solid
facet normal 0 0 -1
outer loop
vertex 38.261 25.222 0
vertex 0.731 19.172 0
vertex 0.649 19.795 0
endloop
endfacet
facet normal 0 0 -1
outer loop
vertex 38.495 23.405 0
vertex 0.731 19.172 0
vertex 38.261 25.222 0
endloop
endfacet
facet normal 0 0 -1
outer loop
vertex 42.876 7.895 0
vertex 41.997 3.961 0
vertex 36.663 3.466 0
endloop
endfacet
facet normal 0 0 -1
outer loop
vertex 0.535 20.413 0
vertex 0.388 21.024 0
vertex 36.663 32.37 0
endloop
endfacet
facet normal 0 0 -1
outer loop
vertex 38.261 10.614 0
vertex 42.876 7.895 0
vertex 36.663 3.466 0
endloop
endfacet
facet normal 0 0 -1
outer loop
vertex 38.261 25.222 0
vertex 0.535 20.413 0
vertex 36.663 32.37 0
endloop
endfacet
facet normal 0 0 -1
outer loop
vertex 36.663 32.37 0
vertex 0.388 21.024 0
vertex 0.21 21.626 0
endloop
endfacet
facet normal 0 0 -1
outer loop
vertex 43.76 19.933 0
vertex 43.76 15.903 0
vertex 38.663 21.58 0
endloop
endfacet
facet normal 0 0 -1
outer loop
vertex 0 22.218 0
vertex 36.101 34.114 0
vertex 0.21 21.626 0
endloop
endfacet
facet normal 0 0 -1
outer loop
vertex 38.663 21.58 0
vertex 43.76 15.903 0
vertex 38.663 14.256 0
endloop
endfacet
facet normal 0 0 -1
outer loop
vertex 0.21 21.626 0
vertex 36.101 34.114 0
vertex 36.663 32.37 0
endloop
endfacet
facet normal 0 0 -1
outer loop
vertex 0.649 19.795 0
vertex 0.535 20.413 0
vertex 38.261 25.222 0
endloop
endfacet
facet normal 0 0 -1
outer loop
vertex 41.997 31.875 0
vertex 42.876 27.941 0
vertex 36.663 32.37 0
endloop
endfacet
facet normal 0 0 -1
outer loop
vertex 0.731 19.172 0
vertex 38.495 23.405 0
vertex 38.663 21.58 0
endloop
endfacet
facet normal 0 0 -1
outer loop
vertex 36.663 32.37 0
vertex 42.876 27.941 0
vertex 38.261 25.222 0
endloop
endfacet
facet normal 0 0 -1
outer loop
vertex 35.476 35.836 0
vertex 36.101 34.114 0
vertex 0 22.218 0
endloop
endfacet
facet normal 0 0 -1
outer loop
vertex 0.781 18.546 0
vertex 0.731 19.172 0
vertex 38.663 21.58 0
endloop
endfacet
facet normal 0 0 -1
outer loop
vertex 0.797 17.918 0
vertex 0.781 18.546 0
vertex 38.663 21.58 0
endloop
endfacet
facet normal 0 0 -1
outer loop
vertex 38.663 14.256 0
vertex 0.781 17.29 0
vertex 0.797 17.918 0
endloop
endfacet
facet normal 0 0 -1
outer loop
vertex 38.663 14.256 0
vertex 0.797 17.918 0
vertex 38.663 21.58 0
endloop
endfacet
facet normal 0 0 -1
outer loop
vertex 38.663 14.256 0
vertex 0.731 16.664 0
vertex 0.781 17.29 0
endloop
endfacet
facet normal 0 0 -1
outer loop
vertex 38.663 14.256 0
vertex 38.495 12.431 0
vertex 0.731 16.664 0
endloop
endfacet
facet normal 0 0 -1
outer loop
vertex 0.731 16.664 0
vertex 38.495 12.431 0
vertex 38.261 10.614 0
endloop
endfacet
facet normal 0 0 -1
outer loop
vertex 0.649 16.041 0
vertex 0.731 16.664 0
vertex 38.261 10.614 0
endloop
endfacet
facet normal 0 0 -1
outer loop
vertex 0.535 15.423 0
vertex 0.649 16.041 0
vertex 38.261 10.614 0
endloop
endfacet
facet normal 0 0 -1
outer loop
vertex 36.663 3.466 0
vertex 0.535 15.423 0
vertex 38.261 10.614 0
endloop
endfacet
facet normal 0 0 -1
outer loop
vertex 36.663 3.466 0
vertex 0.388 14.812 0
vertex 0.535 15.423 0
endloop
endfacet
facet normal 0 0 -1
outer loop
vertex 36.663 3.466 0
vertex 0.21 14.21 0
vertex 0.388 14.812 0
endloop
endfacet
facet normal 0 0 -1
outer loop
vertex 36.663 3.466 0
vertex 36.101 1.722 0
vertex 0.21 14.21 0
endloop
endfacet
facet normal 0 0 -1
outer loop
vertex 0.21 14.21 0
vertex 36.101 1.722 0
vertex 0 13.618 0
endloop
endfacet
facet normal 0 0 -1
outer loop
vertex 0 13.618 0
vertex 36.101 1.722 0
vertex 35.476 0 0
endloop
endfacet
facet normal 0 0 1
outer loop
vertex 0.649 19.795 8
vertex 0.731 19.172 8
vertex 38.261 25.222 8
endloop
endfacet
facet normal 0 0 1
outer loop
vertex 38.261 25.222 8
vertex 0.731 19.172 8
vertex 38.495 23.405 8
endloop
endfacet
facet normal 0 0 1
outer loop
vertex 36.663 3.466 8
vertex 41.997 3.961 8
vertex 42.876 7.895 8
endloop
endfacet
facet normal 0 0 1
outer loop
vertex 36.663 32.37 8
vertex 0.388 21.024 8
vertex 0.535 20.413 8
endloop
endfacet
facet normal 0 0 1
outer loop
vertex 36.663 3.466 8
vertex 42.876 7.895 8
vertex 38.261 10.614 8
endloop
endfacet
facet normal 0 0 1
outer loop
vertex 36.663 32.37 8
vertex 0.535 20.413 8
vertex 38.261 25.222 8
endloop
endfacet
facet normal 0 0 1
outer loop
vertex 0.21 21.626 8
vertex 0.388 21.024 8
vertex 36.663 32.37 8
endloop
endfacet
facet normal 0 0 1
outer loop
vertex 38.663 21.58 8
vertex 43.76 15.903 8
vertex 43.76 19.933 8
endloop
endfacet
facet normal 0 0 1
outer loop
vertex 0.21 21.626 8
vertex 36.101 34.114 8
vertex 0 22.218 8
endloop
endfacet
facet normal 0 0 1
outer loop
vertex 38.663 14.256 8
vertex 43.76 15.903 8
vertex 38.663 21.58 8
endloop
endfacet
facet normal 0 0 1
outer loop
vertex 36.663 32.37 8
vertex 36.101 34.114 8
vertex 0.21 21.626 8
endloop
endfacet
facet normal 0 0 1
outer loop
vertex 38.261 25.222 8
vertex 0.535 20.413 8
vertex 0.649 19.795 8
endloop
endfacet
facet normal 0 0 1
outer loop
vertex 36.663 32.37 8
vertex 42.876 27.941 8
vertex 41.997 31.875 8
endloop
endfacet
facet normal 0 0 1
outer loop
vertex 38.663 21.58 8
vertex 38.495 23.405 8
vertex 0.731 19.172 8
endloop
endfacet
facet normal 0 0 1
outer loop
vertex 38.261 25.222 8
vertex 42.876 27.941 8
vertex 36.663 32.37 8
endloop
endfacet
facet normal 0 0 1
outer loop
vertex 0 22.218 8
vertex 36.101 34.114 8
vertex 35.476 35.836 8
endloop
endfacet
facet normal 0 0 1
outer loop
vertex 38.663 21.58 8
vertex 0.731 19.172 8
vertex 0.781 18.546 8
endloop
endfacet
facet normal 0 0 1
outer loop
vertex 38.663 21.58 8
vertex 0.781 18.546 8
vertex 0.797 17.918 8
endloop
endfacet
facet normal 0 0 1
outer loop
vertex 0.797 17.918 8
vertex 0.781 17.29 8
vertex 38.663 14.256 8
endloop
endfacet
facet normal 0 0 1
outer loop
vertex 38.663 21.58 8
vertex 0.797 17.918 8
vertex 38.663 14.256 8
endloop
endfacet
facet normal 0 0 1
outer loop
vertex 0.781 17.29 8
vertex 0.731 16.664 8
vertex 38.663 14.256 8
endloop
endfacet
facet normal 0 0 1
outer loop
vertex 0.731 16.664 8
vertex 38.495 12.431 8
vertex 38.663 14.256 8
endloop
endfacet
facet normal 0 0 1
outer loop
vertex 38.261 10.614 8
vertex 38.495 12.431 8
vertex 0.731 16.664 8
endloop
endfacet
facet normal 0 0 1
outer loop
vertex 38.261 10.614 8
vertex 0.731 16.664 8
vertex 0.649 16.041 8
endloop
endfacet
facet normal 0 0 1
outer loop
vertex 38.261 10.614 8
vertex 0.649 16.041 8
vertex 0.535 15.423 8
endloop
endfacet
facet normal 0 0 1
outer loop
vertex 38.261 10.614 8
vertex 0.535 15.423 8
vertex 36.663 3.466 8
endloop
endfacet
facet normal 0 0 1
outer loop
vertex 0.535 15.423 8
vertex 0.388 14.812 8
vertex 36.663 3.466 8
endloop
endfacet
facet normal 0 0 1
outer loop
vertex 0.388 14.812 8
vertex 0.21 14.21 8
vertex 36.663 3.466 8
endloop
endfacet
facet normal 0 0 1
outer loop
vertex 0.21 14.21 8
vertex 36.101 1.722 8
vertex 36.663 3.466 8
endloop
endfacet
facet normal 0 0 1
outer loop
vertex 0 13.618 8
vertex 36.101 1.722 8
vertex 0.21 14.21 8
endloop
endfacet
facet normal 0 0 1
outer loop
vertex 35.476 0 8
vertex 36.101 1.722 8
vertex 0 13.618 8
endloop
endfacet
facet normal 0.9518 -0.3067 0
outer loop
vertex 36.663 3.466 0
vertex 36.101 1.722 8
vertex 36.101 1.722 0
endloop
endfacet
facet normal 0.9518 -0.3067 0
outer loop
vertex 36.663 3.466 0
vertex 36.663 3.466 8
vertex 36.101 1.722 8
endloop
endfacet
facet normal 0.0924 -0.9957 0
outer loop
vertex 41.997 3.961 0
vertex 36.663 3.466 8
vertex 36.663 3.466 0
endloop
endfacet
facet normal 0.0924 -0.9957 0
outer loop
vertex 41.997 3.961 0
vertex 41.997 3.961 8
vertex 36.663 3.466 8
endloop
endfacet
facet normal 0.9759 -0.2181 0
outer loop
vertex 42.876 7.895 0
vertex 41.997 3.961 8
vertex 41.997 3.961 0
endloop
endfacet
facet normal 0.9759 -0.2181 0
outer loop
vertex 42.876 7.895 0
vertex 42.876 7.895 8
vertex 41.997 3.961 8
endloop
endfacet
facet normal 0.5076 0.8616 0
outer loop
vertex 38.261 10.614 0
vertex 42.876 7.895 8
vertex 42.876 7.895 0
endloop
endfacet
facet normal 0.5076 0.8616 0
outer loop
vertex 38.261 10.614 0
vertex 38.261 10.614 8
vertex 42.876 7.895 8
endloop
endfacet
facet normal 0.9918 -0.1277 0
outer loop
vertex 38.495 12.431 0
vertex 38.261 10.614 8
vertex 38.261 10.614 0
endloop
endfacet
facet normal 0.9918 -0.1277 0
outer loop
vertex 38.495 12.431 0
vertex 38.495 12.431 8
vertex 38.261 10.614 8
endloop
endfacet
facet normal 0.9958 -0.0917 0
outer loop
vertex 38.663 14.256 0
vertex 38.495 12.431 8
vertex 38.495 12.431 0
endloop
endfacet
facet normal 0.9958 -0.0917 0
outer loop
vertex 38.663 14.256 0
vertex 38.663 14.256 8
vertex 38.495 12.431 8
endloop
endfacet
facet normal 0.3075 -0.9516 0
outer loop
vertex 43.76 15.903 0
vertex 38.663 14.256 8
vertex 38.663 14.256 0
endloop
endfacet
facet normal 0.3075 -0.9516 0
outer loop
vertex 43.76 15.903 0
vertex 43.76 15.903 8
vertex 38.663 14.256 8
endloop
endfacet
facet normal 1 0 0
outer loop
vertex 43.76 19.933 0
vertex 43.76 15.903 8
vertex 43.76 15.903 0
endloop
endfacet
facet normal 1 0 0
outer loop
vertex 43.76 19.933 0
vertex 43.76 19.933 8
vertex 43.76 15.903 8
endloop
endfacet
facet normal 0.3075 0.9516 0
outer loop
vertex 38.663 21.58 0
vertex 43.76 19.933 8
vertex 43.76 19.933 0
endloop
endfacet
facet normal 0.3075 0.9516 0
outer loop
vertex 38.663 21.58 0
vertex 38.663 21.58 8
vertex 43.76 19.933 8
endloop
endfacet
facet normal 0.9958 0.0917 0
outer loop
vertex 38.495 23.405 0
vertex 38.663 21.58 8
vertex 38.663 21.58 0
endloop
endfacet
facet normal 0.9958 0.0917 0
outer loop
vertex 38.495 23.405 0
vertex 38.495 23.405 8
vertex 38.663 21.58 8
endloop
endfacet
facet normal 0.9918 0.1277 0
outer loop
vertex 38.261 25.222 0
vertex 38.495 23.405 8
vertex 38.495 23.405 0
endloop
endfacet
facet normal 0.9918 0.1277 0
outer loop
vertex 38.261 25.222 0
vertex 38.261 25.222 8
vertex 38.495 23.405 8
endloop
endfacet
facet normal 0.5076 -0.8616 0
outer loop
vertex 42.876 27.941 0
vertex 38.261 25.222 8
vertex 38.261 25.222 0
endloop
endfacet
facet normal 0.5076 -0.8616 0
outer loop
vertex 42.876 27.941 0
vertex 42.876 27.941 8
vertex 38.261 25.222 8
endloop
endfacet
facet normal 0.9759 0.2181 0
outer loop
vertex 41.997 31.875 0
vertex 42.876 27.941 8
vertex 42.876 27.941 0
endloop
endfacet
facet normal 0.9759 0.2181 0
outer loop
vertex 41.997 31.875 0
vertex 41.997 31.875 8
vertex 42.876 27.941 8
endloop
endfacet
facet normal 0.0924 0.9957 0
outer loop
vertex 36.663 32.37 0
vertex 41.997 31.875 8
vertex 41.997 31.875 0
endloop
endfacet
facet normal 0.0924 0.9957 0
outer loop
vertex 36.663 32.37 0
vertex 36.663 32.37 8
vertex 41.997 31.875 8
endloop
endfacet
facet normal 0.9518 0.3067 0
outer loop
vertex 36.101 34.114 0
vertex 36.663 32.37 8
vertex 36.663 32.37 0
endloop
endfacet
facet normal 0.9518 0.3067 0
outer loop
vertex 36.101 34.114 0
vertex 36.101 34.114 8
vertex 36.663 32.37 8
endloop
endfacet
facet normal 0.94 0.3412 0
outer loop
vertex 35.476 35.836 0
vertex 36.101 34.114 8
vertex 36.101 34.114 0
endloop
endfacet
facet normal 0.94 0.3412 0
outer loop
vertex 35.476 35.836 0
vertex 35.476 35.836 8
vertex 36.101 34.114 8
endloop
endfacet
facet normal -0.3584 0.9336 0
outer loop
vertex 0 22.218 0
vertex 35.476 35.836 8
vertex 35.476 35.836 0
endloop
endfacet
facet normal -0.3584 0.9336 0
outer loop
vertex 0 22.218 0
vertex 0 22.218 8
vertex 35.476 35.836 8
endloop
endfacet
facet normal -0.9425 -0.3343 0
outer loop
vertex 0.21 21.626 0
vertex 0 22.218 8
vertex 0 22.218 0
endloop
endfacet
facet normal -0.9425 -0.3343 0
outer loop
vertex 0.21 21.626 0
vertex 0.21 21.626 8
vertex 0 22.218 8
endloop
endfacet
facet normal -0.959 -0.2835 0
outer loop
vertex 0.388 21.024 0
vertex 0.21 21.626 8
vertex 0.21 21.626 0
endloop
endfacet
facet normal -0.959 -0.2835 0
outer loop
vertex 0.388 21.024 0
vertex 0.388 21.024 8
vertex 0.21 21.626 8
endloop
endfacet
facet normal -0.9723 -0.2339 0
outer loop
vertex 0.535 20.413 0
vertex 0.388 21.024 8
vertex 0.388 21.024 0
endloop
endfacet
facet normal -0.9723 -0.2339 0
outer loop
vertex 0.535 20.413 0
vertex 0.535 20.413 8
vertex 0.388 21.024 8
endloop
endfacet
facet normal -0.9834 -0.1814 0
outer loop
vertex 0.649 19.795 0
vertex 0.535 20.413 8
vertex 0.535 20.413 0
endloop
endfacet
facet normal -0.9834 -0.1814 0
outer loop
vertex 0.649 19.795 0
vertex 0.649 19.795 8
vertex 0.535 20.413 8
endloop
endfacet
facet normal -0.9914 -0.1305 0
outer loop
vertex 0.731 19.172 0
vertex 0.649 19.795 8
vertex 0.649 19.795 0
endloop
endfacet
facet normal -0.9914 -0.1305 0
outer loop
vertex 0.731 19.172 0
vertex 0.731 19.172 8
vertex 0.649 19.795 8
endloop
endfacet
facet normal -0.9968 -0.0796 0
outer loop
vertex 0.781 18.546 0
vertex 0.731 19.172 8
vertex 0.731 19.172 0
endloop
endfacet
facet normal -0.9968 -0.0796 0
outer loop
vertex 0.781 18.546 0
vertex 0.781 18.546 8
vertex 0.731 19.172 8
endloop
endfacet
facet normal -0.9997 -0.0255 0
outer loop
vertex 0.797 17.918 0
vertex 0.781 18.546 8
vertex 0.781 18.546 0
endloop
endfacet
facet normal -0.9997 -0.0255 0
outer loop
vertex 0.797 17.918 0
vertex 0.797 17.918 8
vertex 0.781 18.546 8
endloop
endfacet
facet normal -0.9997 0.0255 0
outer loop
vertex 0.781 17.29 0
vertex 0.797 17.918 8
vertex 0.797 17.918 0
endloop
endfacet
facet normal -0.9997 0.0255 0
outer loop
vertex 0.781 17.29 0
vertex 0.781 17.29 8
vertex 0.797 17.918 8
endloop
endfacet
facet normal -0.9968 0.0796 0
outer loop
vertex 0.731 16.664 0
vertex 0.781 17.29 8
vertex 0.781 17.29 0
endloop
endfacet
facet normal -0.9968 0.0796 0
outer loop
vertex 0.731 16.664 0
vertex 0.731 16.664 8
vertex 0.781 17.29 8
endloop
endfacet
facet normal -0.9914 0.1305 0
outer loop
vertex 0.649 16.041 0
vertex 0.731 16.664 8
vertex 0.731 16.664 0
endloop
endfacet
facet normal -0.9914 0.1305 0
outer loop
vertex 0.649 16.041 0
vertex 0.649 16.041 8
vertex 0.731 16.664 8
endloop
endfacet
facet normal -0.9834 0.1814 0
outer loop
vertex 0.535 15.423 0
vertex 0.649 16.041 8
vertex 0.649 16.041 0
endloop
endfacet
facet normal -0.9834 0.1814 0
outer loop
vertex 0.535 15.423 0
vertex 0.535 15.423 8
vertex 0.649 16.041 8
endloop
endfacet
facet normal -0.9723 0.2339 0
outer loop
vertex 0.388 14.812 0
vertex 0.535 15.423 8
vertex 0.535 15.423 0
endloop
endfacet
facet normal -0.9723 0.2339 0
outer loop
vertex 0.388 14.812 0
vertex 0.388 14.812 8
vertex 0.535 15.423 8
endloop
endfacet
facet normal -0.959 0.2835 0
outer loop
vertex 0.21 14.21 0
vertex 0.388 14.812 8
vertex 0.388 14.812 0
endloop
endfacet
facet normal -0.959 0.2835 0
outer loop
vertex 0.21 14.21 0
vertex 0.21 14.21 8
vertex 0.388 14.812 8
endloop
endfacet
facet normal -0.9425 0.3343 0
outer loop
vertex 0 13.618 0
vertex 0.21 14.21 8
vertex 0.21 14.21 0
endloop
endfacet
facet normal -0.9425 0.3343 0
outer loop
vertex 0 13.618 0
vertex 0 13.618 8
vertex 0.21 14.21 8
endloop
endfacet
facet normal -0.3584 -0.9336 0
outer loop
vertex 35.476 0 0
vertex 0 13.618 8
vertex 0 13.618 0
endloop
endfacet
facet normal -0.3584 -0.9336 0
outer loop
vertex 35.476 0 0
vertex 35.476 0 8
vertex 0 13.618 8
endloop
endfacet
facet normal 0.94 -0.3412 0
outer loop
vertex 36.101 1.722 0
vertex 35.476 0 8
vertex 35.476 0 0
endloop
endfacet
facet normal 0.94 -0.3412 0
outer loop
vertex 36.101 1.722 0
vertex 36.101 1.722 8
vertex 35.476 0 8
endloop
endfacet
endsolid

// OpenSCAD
$fn = 32;

// ----------------------------------------------------------------------
// Gear sector: 3 teeth on 42 degrees
// ----------------------------------------------------------------------

// --- parameters (mm) ---
sector_angle = 42;        // sector angle, degrees
root_r = 50;              // root circle radius
tooth_h = 5;              // tooth height over the root circle
teeth = 3;                // number of teeth on the sector
hub_r = 12;               // hub bore radius
plate_t = 8;              // sector thickness, Z
arc_step = 3;             // sampling step of the root/hub arcs, degrees

tip_r = root_r + tooth_h;  // tip circle radius

profile = [[35.476, 0], [36.101, 1.722], [36.663, 3.466], [41.997, 3.961], [42.876, 7.895], [38.261, 10.614], [38.495, 12.431], [38.663, 14.256], [43.76, 15.903], [43.76, 19.933], [38.663, 21.58], [38.495, 23.405], [38.261, 25.222], [42.876, 27.941], [41.997, 31.875], [36.663, 32.37], [36.101, 34.114], [35.476, 35.836], [0, 22.218], [0.21, 21.626], [0.388, 21.024], [0.535, 20.413], [0.649, 19.795], [0.731, 19.172], [0.781, 18.546], [0.797, 17.918], [0.781, 17.29], [0.731, 16.664], [0.649, 16.041], [0.535, 15.423], [0.388, 14.812], [0.21, 14.21], [0, 13.618]];  // primary outline, 33 points, counter clockwise

// --- the one profile operation ---
linear_extrude(height = plate_t) polygon(points = profile);
